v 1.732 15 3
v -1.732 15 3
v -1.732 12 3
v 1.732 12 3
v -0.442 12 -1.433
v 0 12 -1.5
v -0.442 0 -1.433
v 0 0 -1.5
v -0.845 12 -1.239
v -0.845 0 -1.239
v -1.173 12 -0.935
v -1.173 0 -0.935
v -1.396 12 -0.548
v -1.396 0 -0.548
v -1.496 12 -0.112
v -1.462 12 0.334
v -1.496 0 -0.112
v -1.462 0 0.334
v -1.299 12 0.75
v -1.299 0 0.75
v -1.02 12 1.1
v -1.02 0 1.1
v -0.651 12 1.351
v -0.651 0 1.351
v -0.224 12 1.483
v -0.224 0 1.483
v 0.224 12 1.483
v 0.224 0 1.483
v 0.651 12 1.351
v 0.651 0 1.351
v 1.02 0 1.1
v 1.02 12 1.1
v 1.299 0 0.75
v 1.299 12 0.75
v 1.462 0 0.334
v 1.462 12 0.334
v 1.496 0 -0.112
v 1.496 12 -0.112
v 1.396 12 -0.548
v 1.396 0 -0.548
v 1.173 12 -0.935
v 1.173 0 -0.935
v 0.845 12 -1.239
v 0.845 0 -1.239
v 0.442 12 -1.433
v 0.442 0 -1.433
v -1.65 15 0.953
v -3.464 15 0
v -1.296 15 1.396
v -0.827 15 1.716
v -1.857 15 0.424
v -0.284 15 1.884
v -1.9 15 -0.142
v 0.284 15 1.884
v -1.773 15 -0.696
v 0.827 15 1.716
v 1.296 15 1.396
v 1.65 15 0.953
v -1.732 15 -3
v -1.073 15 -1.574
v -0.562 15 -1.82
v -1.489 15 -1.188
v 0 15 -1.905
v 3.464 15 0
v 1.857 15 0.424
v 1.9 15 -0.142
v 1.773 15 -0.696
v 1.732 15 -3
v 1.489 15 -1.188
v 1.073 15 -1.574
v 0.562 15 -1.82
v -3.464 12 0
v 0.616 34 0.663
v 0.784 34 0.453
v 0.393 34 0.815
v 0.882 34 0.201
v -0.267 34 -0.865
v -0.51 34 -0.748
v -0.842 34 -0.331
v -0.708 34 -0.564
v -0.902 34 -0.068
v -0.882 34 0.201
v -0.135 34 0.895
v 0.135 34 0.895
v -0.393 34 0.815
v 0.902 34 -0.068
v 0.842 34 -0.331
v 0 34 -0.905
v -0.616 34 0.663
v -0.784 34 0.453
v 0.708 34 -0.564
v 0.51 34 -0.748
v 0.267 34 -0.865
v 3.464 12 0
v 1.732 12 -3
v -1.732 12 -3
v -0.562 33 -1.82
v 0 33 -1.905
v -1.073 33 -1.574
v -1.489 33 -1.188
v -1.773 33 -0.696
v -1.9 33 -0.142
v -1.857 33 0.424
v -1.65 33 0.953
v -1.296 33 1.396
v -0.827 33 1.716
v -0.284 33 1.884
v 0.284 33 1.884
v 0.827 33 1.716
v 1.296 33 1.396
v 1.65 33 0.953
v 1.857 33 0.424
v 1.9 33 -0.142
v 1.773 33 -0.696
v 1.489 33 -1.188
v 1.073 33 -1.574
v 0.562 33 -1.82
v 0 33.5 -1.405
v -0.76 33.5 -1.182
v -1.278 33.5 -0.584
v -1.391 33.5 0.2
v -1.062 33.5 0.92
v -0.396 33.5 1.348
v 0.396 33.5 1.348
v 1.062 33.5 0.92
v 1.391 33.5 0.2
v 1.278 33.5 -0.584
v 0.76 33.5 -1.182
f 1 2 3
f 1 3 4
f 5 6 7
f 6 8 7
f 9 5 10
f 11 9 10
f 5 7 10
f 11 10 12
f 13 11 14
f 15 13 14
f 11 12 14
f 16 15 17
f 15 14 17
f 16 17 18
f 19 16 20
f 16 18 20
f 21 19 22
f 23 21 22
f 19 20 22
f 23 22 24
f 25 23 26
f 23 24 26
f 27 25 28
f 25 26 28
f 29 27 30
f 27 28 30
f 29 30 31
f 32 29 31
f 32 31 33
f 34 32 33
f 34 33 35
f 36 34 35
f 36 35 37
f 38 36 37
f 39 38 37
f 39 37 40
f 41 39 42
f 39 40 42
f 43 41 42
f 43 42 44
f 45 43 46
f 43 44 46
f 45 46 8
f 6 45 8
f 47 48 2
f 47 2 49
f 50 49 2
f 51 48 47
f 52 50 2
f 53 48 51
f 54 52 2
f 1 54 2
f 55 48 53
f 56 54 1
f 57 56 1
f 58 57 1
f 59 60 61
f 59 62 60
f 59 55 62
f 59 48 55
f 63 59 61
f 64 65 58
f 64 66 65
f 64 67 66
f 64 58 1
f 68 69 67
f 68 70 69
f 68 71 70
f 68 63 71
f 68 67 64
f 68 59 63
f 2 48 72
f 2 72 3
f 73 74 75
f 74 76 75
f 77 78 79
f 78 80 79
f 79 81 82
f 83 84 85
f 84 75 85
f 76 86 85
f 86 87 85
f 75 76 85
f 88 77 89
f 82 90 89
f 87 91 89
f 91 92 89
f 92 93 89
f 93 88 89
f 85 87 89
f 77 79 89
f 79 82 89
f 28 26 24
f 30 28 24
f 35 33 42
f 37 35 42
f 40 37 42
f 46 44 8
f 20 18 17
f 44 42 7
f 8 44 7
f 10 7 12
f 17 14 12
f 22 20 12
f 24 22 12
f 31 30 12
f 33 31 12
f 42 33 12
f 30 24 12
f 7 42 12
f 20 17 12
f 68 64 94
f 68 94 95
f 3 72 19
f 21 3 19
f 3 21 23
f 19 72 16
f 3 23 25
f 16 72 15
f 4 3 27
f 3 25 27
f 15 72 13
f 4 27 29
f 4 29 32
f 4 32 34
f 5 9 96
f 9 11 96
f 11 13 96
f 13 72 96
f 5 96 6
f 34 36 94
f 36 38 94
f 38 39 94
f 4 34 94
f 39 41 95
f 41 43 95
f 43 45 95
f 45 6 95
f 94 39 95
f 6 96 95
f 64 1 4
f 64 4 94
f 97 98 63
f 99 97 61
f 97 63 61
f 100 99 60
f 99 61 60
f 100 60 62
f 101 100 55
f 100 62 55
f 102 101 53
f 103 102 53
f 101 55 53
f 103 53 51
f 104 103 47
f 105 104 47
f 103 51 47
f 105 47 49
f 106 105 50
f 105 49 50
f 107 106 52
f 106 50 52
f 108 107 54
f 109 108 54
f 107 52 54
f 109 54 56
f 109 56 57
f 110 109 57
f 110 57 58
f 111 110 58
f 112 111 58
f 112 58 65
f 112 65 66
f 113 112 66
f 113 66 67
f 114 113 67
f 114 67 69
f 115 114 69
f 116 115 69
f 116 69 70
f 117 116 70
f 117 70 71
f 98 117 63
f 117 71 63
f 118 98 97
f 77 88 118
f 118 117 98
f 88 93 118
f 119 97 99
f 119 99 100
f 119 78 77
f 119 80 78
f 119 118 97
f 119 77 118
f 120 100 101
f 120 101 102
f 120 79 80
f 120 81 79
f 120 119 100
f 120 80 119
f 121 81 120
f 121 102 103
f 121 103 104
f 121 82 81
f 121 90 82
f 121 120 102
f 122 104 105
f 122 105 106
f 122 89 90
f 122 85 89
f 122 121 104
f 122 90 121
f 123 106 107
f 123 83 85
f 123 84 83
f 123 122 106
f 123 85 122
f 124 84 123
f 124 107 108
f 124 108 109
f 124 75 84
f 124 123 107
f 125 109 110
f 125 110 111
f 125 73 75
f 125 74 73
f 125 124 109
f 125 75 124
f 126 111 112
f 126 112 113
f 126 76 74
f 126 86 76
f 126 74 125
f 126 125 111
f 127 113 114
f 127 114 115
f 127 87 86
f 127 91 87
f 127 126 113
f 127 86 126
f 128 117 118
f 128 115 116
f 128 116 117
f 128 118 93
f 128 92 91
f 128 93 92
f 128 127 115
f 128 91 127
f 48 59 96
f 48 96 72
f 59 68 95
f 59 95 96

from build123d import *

# Parameters (mm, degrees)
BOSS_EXTRUDE1_DEPTH = 3
CHAMFER1_SIZE       = 1


with BuildPart() as part:
    # Sketch1 → Revolve1 (revolve)
    with BuildSketch(Plane.XY, mode=Mode.PRIVATE) as revolve1_sk:
        Polygon((0, 34), (-1.905, 34), (-1.905, 15), (-2.5, 15), (-2.5, 12), (-1.5, 12), (-1.5, 0), (0, 0), align=None)
    revolve(revolve1_sk.sketch.rotate(Axis((0, 0, 0), (0, 1, 0)), 270), axis=Axis((0, 0, 0), (0, 1, 0)))

    # Sketch2 → Boss-Extrude1 (add)
    with BuildSketch(Plane(origin=(0, 15, 0), x_dir=(1, 0, 0), z_dir=(0, 1, 0))):
        Polygon((-3.464101615, 0), (-1.732050808, -3), (1.732050808, -3), (3.464101615, 0), (1.732050808, 3), (-1.732050808, 3), align=None)
    extrude(amount=-BOSS_EXTRUDE1_DEPTH)

    # Chamfer1
    chamfer1_edges = [part.edges().sort_by_distance(p)[0] for p in [
        (0, 34, 1.905),
    ]]
    chamfer(chamfer1_edges, length=CHAMFER1_SIZE)


solid = part.part
